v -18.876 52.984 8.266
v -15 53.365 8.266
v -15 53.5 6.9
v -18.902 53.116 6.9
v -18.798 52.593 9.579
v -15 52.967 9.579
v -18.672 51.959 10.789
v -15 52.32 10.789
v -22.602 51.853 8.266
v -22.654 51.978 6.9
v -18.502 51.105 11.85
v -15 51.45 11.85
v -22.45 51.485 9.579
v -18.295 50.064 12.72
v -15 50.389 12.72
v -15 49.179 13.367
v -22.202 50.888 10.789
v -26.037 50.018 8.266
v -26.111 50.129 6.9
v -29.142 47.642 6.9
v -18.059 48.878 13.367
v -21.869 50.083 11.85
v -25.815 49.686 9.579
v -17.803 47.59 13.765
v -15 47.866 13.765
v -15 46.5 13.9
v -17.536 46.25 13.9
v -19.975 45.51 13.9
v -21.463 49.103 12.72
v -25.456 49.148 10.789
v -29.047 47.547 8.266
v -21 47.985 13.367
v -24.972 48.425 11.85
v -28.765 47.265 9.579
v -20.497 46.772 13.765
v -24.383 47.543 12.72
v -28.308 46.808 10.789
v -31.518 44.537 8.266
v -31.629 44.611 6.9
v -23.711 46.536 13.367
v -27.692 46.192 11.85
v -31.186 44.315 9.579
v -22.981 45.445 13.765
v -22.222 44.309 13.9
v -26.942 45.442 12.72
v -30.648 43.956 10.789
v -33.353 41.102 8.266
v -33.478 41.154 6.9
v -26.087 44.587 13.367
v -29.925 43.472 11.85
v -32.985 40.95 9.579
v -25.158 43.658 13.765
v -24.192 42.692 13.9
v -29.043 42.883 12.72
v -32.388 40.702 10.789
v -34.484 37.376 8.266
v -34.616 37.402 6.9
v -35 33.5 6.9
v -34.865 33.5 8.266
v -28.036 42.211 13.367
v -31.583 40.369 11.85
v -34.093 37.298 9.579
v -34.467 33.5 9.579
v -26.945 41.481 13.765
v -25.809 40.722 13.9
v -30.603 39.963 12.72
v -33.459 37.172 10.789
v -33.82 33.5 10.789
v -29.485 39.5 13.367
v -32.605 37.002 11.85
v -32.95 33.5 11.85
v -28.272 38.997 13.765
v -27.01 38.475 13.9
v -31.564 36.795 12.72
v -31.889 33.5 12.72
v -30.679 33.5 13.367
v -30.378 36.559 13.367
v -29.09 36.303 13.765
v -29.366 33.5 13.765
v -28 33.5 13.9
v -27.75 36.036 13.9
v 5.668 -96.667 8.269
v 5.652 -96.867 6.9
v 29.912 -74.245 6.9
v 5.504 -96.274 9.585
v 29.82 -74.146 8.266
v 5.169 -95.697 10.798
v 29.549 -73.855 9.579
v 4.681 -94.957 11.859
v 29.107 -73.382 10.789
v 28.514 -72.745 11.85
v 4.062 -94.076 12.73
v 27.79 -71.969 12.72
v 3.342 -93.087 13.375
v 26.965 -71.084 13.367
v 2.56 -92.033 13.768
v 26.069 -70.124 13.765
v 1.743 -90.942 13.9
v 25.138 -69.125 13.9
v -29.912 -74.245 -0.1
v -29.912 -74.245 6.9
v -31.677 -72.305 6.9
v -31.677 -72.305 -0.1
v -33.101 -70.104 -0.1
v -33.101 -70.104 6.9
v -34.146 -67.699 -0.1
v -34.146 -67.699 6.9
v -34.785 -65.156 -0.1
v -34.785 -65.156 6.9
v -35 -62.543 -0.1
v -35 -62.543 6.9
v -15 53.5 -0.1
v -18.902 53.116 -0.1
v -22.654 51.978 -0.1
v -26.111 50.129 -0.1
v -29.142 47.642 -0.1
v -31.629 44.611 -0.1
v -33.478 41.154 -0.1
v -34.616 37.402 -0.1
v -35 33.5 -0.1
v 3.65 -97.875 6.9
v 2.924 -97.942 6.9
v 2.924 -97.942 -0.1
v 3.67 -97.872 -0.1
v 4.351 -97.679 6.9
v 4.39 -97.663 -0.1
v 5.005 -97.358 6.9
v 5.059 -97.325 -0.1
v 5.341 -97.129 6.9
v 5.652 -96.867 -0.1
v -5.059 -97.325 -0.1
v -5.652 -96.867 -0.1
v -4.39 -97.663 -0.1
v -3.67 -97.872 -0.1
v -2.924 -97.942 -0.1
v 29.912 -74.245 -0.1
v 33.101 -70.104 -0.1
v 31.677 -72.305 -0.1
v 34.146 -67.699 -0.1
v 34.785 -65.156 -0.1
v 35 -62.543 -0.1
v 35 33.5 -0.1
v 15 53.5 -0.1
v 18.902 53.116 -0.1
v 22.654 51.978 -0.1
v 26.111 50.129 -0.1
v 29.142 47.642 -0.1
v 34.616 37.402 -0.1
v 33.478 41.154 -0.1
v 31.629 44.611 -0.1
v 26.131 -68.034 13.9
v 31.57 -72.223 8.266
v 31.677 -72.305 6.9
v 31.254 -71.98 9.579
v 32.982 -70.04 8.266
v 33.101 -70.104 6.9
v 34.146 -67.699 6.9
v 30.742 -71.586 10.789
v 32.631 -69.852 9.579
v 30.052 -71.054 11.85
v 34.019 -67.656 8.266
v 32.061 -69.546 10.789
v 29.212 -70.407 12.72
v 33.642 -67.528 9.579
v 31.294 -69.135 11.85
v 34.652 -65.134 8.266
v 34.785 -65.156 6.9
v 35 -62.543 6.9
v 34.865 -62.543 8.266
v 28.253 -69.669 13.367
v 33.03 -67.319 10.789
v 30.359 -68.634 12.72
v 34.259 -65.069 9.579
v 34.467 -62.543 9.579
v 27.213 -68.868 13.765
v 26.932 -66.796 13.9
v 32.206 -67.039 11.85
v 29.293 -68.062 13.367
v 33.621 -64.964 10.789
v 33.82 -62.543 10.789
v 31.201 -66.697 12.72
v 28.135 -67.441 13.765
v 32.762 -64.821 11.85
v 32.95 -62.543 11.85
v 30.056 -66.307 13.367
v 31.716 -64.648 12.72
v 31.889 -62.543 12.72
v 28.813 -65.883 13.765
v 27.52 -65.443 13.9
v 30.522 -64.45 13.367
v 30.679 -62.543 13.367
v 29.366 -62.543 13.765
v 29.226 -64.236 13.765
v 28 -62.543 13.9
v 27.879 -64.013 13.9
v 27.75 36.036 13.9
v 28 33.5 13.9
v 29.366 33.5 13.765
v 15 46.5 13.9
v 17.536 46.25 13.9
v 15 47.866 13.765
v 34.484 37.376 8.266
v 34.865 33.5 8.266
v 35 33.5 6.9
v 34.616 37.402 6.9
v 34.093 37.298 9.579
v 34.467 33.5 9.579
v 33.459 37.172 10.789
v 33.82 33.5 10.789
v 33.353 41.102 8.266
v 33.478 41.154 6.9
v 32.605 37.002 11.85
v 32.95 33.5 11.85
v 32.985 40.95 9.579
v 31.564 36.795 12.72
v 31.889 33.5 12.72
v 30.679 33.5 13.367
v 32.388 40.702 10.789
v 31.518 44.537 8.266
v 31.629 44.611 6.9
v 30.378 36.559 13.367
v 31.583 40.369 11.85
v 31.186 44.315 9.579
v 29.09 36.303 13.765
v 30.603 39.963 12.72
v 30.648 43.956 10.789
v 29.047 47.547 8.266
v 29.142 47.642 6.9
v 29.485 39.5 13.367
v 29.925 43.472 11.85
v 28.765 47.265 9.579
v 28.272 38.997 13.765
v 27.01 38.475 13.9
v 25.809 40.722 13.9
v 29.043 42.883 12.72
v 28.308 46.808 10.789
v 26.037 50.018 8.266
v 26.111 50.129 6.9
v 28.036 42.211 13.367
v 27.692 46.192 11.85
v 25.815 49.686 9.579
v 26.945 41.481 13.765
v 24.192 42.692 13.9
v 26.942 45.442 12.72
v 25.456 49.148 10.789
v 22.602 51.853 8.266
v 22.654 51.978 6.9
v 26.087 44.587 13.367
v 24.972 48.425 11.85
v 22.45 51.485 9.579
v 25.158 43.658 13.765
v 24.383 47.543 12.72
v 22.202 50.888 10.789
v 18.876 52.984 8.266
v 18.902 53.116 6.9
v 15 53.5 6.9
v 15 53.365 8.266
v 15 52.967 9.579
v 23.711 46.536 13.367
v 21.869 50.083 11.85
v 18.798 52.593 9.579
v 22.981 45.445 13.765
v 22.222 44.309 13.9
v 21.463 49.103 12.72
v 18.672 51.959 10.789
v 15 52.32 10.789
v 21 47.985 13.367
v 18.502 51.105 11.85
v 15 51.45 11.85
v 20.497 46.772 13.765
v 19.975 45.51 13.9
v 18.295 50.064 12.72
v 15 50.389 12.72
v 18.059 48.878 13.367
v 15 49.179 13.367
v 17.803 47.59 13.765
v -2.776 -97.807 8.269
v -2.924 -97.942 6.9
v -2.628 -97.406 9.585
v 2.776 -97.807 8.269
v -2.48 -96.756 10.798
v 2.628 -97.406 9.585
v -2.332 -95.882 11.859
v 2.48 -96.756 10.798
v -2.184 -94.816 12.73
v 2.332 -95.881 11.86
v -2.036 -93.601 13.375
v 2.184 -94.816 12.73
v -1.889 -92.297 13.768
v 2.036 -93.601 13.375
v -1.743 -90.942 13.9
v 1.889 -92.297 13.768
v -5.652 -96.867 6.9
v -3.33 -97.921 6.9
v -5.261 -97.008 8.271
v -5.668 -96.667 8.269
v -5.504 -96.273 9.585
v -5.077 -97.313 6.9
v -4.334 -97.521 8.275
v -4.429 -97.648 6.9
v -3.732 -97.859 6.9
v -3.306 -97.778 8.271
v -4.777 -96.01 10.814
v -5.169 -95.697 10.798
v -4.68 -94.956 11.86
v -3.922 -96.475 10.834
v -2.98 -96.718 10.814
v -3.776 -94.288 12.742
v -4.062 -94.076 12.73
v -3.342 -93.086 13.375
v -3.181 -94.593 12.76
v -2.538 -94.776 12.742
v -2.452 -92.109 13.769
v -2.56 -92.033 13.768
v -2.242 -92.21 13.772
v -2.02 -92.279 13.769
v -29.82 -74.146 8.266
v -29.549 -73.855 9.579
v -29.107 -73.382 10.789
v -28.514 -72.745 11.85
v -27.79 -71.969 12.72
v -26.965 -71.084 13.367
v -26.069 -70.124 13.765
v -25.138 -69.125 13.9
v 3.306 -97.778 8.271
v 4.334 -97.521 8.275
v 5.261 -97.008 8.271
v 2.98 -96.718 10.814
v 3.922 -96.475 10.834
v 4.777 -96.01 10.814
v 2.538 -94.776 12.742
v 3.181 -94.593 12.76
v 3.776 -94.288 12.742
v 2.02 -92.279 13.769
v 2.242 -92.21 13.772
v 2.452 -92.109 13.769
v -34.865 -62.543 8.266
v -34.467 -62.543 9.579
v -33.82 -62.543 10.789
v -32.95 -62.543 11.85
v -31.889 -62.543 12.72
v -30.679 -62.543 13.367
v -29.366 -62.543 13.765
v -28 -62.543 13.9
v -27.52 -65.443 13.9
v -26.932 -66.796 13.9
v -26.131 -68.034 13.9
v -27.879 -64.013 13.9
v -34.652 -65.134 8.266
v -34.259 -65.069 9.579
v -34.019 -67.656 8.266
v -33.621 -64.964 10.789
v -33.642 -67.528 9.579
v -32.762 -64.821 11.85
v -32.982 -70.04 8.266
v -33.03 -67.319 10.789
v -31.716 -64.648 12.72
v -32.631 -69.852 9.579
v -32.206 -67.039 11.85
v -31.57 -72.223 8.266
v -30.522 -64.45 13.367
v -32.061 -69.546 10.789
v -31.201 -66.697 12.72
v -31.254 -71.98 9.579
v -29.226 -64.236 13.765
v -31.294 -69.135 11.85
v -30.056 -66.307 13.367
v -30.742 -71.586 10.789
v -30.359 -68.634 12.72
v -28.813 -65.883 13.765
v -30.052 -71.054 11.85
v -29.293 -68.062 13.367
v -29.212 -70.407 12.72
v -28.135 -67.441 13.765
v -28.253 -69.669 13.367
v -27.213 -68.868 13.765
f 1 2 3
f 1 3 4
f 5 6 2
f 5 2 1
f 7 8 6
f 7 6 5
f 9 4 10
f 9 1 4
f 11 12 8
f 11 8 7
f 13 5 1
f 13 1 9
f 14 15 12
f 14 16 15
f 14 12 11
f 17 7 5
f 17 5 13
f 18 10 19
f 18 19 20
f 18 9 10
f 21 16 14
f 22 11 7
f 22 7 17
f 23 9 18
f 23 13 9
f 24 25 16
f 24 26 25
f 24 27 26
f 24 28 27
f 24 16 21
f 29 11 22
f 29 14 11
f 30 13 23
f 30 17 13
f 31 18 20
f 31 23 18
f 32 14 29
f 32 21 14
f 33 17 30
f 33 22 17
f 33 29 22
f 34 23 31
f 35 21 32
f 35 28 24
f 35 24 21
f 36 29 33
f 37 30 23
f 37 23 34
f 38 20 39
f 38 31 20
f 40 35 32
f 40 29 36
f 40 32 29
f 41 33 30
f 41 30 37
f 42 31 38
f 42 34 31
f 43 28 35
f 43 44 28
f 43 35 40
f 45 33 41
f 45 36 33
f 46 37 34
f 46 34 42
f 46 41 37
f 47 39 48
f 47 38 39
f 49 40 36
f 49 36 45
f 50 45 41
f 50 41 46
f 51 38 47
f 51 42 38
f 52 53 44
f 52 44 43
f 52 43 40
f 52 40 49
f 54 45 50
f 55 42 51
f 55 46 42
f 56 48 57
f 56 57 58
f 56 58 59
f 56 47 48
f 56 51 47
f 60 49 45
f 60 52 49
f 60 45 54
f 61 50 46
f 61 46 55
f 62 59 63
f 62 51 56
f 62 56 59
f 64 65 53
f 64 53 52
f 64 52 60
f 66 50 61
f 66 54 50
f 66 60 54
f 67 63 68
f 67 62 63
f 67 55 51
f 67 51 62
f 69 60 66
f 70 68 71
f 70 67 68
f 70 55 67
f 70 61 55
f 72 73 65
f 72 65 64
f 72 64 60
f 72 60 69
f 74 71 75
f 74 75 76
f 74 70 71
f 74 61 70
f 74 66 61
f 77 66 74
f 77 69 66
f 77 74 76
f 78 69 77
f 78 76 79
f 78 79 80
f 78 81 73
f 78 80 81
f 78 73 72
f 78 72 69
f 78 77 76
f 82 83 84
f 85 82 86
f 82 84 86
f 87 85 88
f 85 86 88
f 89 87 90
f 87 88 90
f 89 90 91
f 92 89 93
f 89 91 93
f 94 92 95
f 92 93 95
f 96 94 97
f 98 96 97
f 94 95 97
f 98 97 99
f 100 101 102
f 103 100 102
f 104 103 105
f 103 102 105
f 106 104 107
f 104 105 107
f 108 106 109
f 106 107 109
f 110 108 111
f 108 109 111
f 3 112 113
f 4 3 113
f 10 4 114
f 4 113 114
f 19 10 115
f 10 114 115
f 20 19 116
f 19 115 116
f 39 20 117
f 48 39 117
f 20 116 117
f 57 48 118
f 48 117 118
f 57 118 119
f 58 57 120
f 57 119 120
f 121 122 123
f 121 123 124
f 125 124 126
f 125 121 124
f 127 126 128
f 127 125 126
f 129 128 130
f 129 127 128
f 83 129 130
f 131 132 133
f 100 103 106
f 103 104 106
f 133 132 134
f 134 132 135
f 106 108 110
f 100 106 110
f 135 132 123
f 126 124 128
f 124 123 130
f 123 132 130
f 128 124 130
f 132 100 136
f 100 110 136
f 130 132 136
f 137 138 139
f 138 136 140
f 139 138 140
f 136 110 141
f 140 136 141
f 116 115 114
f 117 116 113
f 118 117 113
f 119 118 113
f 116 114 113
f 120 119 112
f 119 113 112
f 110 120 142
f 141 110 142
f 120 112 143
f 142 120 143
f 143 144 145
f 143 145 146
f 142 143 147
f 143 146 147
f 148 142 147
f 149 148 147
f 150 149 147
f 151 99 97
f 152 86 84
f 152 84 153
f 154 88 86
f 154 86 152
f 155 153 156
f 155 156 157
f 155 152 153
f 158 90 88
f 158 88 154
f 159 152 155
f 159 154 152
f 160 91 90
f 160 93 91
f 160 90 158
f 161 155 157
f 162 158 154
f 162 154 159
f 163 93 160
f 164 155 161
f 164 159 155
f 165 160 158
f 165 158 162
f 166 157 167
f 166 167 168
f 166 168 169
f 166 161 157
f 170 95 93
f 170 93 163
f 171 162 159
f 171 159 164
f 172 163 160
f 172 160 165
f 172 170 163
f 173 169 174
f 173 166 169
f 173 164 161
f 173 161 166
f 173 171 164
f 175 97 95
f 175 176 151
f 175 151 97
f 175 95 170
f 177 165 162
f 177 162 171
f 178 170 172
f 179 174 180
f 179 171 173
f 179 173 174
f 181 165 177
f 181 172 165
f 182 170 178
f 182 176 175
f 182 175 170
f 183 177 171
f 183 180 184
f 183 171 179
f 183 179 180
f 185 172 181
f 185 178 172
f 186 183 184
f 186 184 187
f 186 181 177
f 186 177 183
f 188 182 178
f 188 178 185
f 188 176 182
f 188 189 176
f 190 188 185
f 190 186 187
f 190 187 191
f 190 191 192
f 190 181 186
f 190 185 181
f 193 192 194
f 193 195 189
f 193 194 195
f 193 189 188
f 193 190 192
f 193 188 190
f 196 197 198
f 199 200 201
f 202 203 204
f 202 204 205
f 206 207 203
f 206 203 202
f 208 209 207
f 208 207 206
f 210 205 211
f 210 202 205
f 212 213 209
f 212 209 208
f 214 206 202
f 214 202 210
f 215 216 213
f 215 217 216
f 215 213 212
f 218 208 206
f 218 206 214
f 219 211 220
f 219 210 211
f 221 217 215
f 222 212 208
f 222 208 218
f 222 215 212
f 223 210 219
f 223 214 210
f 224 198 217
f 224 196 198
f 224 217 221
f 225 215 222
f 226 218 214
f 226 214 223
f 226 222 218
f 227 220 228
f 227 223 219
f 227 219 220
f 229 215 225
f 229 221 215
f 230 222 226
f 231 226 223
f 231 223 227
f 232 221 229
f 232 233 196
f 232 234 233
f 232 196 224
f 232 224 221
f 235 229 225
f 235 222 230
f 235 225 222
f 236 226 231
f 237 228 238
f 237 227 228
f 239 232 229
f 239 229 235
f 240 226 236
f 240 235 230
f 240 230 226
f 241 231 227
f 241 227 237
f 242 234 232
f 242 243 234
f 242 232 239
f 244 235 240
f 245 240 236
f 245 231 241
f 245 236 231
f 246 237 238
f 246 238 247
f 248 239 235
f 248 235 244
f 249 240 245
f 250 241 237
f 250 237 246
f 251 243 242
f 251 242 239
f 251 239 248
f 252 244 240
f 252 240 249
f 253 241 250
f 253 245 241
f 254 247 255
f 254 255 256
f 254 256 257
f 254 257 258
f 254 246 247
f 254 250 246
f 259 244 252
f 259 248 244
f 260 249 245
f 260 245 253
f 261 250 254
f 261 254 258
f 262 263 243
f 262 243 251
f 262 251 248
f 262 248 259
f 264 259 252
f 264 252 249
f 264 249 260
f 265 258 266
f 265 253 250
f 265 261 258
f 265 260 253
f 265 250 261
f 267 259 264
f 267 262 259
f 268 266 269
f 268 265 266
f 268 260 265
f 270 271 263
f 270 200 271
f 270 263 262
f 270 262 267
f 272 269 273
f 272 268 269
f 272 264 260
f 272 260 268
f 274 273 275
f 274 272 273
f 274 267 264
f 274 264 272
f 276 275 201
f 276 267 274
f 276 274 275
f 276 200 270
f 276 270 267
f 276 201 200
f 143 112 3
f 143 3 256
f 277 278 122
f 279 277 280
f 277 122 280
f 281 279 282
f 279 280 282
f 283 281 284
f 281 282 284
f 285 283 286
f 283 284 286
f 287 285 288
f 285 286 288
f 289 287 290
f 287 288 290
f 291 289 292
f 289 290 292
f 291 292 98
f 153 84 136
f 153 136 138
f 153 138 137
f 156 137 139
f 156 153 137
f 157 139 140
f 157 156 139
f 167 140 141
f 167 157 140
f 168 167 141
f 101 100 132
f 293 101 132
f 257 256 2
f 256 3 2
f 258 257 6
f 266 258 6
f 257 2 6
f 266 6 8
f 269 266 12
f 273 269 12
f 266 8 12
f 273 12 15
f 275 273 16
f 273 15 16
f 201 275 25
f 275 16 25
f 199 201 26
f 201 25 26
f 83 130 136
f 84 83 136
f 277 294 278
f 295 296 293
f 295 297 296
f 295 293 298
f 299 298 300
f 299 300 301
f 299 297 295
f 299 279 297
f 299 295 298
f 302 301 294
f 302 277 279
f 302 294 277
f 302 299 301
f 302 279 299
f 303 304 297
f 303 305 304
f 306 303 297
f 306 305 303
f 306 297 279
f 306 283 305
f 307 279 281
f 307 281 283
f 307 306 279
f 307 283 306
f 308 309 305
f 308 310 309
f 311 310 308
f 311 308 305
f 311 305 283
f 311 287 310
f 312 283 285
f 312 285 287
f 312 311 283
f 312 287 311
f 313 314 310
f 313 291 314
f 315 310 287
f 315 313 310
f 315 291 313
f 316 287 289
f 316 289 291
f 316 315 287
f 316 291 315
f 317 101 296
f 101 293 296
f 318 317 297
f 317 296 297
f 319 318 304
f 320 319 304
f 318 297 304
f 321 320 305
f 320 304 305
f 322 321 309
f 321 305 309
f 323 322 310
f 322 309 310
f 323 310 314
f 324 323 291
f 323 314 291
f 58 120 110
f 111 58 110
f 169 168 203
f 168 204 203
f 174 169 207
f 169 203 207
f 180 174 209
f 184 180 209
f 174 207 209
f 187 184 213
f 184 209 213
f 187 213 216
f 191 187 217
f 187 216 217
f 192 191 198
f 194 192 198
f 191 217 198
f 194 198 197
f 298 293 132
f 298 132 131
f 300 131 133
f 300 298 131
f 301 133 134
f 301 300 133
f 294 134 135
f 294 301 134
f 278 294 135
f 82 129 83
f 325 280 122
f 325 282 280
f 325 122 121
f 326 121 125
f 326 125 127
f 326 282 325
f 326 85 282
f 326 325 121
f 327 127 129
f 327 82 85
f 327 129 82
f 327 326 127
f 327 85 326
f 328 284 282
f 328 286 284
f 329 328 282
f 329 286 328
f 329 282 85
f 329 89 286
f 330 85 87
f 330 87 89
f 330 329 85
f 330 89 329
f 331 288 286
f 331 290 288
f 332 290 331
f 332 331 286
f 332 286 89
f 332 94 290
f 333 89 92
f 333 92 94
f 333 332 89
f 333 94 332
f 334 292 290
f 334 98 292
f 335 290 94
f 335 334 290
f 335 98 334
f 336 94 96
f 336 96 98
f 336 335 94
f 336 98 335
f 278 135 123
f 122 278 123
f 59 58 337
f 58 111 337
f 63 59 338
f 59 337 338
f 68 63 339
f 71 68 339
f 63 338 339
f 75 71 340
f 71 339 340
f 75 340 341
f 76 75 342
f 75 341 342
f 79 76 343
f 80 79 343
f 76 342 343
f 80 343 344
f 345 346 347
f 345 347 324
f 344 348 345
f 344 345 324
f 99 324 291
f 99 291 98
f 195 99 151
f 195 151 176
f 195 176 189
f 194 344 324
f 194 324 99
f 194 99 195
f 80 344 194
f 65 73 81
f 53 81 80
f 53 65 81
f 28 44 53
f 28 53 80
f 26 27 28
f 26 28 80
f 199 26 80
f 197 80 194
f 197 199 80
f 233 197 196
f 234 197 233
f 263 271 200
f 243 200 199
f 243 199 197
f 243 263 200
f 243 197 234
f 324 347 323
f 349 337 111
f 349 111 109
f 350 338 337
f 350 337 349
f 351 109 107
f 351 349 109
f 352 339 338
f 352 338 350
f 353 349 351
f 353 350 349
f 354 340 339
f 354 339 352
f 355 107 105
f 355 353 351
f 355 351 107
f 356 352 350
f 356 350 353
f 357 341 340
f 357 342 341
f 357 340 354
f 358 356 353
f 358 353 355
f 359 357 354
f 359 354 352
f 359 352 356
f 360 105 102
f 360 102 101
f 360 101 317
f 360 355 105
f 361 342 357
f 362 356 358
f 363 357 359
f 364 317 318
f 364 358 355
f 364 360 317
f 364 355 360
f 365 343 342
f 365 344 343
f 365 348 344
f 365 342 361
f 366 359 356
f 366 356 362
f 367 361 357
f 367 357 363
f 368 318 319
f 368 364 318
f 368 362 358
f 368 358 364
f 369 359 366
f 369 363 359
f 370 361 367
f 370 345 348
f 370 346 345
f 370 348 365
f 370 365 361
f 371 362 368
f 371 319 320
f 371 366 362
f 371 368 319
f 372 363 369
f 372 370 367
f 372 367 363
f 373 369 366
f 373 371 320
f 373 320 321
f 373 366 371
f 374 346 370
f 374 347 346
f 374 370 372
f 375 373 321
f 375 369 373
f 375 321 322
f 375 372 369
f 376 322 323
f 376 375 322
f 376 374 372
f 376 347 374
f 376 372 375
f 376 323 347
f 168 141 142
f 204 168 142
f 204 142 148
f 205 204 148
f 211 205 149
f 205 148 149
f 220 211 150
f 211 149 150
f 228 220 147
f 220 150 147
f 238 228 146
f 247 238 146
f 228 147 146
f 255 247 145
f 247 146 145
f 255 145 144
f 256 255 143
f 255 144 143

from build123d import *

# Parameters (mm, degrees)
PAD_DEPTH   = 14
FILLET001_R = 4
FILLET002_R = 16
FILLET_R    = 7


with BuildPart() as part:
    # Sketch → Pad (new body)
    with BuildSketch(Plane.XY):
        with BuildLine():
            Line((-35, -53.5), (-35, -69.5))
            Line((-35, -69.5), (-4.5, -97.94171))
            Line((-4.5, -97.94171), (4.5, -97.94171))
            Line((4.5, -97.94171), (35, -69.5))
            Line((35, -69.5), (35, -53.5))
            Line((35, 33.5), (35, -53.5))
            ThreePointArc((35, 33.5), (29.142136, 47.642136), (15, 53.5))
            Line((-15, 53.5), (15, 53.5))
            ThreePointArc((-15, 53.5), (-29.142136, 47.642136), (-35, 33.5))
            Line((-35, 33.5), (-35, -53.5))
        make_face()
    extrude(amount=PAD_DEPTH)

    # Fillet001
    fillet001_edges = [part.edges().sort_by_distance(p)[0] for p in [
        (-4.5, -97.94171, 7),
        (4.5, -97.94171, 7),
    ]]
    fillet(fillet001_edges, radius=FILLET001_R)

    # Fillet002
    fillet002_edges = [part.edges().sort_by_distance(p)[0] for p in [
        (35, -69.5, 7),
        (-35, -69.5, 7),
    ]]
    fillet(fillet002_edges, radius=FILLET002_R)

    # Fillet
    fillet_edges = [part.edges().sort_by_distance(p)[0] for p in [
        (-17.782163, -85.555893, 14),
        (-33.672961, -68.922987, 14),
        (-4.390363, -97.66338, 14),
        (-35, -58.021501, 14),
        (0, -97.94171, 14),
        (-35, -10, 14),
        (4.390363, -97.66338, 14),
        (-29.142136, 47.642136, 14),
        (17.782163, -85.555893, 14),
        (0, 53.5, 14),
        (33.672961, -68.922987, 14),
        (29.142136, 47.642136, 14),
        (35, -58.021501, 14),
        (35, -10, 14),
    ]]
    fillet(fillet_edges, radius=FILLET_R)


with BuildPart() as part_1:
    # Body104 placement: moved
    add(part.part.moved(Location((0, 0, -0.1))))


solid = part_1.part
